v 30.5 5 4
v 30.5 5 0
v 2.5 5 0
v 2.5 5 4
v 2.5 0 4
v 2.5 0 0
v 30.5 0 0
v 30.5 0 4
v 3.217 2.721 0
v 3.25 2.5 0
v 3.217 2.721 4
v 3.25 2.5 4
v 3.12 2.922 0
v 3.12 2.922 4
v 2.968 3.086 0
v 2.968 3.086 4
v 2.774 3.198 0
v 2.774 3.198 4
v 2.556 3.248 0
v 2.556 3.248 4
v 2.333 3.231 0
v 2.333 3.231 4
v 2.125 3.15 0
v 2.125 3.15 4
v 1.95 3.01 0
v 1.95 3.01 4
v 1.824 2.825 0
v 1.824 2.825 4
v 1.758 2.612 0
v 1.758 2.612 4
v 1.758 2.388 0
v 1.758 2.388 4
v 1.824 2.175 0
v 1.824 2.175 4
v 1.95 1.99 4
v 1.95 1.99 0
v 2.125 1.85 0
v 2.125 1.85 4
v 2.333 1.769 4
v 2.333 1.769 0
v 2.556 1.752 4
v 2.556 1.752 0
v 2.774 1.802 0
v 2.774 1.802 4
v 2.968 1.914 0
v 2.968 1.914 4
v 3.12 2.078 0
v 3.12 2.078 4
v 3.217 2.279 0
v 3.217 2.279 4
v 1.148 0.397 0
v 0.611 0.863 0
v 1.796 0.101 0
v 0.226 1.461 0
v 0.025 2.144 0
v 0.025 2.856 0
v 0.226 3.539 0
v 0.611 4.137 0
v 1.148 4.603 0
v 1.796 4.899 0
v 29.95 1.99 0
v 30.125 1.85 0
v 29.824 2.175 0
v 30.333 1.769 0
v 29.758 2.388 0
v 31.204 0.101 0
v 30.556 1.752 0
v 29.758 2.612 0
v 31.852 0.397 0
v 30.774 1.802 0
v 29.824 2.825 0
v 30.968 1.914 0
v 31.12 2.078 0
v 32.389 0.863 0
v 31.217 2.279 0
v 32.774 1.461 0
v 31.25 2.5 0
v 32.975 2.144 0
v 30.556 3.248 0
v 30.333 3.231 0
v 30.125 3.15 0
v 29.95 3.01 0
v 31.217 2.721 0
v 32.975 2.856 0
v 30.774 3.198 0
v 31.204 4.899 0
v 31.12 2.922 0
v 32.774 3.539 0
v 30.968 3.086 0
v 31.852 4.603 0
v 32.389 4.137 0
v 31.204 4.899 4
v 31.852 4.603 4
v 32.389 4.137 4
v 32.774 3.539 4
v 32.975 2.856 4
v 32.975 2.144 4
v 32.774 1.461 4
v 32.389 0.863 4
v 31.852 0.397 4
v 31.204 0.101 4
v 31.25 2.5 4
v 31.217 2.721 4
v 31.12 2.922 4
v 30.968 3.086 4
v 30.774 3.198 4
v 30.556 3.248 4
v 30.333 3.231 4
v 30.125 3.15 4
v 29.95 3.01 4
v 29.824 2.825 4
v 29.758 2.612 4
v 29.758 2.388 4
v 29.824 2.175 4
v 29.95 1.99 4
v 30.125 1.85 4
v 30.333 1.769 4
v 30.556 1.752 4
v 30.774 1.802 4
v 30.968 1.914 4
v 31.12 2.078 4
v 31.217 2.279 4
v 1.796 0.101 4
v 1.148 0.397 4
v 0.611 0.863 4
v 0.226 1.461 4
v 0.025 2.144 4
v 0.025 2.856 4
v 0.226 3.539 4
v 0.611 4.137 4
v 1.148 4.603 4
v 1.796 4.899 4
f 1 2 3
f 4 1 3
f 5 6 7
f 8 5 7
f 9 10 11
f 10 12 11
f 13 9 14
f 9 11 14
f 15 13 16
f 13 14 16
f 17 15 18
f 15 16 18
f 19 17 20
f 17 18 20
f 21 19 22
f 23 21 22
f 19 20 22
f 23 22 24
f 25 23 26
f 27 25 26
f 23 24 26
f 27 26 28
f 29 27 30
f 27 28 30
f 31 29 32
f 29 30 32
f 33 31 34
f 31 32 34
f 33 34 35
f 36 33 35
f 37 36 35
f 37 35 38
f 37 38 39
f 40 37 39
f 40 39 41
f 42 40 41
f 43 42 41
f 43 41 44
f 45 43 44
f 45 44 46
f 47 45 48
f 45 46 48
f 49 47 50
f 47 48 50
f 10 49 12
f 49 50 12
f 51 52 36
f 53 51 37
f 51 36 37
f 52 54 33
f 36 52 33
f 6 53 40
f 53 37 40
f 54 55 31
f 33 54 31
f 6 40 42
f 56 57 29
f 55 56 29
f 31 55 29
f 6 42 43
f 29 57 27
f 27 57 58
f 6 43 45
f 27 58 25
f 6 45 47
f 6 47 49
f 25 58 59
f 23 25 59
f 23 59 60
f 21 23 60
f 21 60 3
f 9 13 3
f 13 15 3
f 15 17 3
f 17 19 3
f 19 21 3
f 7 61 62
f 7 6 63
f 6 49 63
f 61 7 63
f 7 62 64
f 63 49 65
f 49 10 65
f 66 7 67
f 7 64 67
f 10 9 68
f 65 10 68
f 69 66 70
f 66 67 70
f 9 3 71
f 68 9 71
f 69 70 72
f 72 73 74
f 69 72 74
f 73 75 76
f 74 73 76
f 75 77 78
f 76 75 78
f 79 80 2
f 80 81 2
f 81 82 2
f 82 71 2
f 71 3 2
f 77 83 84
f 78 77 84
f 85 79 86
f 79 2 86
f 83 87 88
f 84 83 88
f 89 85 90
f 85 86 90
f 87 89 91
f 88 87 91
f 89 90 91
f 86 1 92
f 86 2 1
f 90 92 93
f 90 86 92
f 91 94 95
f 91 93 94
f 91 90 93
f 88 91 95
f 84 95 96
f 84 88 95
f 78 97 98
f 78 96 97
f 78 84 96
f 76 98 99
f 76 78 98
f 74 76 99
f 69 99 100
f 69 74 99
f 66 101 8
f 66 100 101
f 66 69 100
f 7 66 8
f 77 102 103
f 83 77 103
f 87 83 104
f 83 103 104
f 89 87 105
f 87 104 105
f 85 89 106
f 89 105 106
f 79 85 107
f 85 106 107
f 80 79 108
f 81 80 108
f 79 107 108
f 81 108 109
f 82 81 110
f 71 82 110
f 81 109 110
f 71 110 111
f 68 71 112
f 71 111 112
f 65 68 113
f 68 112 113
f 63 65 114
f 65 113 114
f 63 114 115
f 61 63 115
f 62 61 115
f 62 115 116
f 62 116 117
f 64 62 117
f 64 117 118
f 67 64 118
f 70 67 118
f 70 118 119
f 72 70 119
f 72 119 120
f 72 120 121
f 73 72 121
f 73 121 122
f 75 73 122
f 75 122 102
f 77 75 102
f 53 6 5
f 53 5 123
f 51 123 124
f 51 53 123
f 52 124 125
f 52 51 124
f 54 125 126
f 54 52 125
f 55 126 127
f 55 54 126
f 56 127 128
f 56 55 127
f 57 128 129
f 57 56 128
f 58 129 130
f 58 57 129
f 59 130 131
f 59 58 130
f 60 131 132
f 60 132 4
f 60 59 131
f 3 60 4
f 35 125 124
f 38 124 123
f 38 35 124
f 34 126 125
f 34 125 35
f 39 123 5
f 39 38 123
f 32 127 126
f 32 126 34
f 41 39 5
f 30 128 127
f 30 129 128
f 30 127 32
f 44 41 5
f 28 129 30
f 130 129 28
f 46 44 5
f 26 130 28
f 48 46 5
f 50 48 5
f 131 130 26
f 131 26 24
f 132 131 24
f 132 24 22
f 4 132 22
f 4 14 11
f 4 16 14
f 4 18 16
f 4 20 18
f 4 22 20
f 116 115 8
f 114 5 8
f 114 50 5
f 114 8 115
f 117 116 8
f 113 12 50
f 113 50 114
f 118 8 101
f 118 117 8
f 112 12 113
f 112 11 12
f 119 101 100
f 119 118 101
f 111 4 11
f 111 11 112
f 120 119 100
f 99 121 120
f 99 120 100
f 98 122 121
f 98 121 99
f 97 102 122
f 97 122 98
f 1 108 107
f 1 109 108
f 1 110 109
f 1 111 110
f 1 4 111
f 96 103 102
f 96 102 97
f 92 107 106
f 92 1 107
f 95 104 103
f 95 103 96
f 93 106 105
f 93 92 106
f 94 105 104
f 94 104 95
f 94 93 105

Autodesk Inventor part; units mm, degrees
ref_plane "YZ Plane" through (0, 0, 0) normal (1, 0, 0) x (0, 1, 0)
ref_plane "XZ Plane" through (0, 0, 0) normal (0, 1, 0) x (-1, 0, 0)
ref_plane "XY Plane" through (0, 0, 0) normal (0, 0, 1) x (1, 0, 0)
sketch "Skizze1" plane through (0, 0, 0) normal (0, 0, 1) x (1, 0, 0)
  line L0 (2.5, 0) -> (30.5, 0)
  line L1 (33, 2.5) -> (33, 2.5)
  line L2 (30.5, 5) -> (2.5, 5)
  line L3 (0, 2.5) -> (0, 2.5)
  arc A0 (2.5, 5) -> (0, 2.5) centre (2.5, 2.5) ccw
  arc A1 (0, 2.5) -> (2.5, 0) centre (2.5, 2.5) ccw
  arc A2 (33, 2.5) -> (30.5, 5) centre (30.5, 2.5) ccw
  arc A3 (30.5, 0) -> (33, 2.5) centre (30.5, 2.5) ccw
  point P0 (0, 0)
  point P1 (33, 5)
  point P2 (0, 5)
  dimension "d0" = 33
  dimension "d9" = 2.5
  dimension "d19" = 5
extrude "Extrusion2" add sketch "Skizze1" along normal blind 4
sketch "Skizze2" plane through (0, 0, 4) normal (0, 0, 1) x (1, 0, 0)
  arc A0 (2.5, 5) -> (2.5, 0) centre (2.5, 2.5) ccw projected
  circle A1 centre (2.5, 2.5) radius 0.75
  arc A2 (30.5, 0) -> (30.5, 5) centre (30.5, 2.5) ccw projected
  circle A3 centre (30.5, 2.5) radius 0.75
  point P0 (0, 0)
  dimension "d15" = 1.5
  dimension "d16" = 1.5
extrude "Extrusion3" cut sketch "Skizze2" against normal blind 4
properties part number "Klemme_Hebel_Entstück"
